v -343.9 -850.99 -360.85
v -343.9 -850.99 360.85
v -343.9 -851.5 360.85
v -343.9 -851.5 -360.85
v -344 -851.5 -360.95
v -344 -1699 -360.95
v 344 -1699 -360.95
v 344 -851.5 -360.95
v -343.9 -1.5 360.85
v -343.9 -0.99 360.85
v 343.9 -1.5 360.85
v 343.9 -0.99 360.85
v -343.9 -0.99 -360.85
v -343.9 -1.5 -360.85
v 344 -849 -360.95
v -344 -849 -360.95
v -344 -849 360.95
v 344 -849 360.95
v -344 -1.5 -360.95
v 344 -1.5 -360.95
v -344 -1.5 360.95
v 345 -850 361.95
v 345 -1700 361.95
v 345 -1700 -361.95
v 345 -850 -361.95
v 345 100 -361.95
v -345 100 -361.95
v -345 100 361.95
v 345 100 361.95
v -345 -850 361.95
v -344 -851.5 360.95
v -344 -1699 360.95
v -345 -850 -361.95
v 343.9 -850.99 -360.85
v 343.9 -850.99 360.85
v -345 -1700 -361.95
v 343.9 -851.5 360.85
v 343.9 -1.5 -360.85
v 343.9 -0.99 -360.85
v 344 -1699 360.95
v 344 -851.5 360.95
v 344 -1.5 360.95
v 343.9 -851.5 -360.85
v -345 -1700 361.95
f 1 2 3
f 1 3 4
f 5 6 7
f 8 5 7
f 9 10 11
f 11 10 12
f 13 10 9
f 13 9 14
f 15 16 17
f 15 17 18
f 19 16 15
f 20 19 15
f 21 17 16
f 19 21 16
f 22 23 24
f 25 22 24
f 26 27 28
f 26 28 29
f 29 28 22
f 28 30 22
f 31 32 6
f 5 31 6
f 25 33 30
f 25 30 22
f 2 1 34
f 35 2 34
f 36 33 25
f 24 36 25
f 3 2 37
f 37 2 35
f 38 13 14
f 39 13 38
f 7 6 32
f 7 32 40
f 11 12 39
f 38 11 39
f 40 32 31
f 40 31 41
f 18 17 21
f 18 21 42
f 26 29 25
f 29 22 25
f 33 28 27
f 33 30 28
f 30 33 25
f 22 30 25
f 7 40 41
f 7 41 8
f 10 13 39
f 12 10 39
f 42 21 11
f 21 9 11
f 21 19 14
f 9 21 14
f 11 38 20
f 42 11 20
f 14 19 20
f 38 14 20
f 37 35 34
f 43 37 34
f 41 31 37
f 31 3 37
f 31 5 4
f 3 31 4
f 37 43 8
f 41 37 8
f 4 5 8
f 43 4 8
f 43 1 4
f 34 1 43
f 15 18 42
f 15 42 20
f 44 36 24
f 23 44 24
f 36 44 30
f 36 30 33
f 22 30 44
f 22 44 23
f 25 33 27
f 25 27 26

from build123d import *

# Parameters (mm, degrees)
SKETCH3_W           = 690
SKETCH3_H           = 723.9
SKETCH3_W_2         = 688
SKETCH3_H_2         = 721.9
BOSS_EXTRUDE4_DEPTH = 850
SKETCH4_W           = 688
SKETCH4_H           = 721.9
BOSS_EXTRUDE5_DEPTH = 1
SKETCH8_W           = 690
SKETCH8_H           = 723.9
SKETCH8_W_2         = 688
SKETCH8_H_2         = 721.9
BOSS_EXTRUDE7_DEPTH = 0.99
SKETCH10_W          = 688
SKETCH10_H          = 721.9
SKETCH10_W_2        = 687.8
SKETCH10_H_2        = 721.7
BOSS_EXTRUDE8_DEPTH = 1.5
SKETCH16_W          = 690
SKETCH16_H          = 723.9
BOSS_EXTRUDE9_DEPTH = 100


with BuildPart() as part:
    # Sketch3 → Boss-Extrude4 (new body)
    with BuildSketch(Plane(origin=(0, -850, 0), x_dir=(1, 0, 0), z_dir=(0, 1, 0))):
        Rectangle(SKETCH3_W, SKETCH3_H)
        Rectangle(SKETCH3_W_2, SKETCH3_H_2, mode=Mode.SUBTRACT)
    extrude(amount=BOSS_EXTRUDE4_DEPTH)

    # Sketch4 → Boss-Extrude5 (add)
    with BuildSketch(Plane(origin=(0, -850, 0), x_dir=(1, 0, 0), z_dir=(0, 1, 0))):
        Rectangle(SKETCH4_W, SKETCH4_H)
    extrude(amount=BOSS_EXTRUDE5_DEPTH)



with BuildPart() as body_2:
    # Sketch8 → Boss-Extrude7 (new body)
    with BuildSketch(Plane(origin=(0, 0, 0), x_dir=(1, 0, 0), z_dir=(0, 1, 0))):
        Rectangle(SKETCH8_W, SKETCH8_H)
        Rectangle(SKETCH8_W_2, SKETCH8_H_2, mode=Mode.SUBTRACT)
        Rectangle(SKETCH8_W_2, SKETCH8_H_2)
    extrude(amount=-BOSS_EXTRUDE7_DEPTH)


with BuildPart() as part_1:
    add(part.part)

    add(body_2.part)  # Boss-Extrude8 merges body 2
    # Sketch10 → Boss-Extrude8 (add)
    with BuildSketch(Plane(origin=(0, 0, 0), x_dir=(1, 0, 0), z_dir=(0, 1, 0))):
        Rectangle(SKETCH10_W, SKETCH10_H)
        Rectangle(SKETCH10_W_2, SKETCH10_H_2, mode=Mode.SUBTRACT)
    extrude(amount=-BOSS_EXTRUDE8_DEPTH)


with BuildPart() as body_2_2:
    # Body-Move/Copy1: copy of part
    add(part_1.part.moved(Location((0, -850, 0))))


with BuildPart() as part_2:
    add(part_1.part)

    # Sketch16 → Boss-Extrude9 (add)
    with BuildSketch(Plane(origin=(0, 0, 0), x_dir=(1, 0, 0), z_dir=(0, 1, 0))):
        Rectangle(SKETCH16_W, SKETCH16_H)
    extrude(amount=BOSS_EXTRUDE9_DEPTH)


solid = Compound([body_2_2.part, part_2.part])
